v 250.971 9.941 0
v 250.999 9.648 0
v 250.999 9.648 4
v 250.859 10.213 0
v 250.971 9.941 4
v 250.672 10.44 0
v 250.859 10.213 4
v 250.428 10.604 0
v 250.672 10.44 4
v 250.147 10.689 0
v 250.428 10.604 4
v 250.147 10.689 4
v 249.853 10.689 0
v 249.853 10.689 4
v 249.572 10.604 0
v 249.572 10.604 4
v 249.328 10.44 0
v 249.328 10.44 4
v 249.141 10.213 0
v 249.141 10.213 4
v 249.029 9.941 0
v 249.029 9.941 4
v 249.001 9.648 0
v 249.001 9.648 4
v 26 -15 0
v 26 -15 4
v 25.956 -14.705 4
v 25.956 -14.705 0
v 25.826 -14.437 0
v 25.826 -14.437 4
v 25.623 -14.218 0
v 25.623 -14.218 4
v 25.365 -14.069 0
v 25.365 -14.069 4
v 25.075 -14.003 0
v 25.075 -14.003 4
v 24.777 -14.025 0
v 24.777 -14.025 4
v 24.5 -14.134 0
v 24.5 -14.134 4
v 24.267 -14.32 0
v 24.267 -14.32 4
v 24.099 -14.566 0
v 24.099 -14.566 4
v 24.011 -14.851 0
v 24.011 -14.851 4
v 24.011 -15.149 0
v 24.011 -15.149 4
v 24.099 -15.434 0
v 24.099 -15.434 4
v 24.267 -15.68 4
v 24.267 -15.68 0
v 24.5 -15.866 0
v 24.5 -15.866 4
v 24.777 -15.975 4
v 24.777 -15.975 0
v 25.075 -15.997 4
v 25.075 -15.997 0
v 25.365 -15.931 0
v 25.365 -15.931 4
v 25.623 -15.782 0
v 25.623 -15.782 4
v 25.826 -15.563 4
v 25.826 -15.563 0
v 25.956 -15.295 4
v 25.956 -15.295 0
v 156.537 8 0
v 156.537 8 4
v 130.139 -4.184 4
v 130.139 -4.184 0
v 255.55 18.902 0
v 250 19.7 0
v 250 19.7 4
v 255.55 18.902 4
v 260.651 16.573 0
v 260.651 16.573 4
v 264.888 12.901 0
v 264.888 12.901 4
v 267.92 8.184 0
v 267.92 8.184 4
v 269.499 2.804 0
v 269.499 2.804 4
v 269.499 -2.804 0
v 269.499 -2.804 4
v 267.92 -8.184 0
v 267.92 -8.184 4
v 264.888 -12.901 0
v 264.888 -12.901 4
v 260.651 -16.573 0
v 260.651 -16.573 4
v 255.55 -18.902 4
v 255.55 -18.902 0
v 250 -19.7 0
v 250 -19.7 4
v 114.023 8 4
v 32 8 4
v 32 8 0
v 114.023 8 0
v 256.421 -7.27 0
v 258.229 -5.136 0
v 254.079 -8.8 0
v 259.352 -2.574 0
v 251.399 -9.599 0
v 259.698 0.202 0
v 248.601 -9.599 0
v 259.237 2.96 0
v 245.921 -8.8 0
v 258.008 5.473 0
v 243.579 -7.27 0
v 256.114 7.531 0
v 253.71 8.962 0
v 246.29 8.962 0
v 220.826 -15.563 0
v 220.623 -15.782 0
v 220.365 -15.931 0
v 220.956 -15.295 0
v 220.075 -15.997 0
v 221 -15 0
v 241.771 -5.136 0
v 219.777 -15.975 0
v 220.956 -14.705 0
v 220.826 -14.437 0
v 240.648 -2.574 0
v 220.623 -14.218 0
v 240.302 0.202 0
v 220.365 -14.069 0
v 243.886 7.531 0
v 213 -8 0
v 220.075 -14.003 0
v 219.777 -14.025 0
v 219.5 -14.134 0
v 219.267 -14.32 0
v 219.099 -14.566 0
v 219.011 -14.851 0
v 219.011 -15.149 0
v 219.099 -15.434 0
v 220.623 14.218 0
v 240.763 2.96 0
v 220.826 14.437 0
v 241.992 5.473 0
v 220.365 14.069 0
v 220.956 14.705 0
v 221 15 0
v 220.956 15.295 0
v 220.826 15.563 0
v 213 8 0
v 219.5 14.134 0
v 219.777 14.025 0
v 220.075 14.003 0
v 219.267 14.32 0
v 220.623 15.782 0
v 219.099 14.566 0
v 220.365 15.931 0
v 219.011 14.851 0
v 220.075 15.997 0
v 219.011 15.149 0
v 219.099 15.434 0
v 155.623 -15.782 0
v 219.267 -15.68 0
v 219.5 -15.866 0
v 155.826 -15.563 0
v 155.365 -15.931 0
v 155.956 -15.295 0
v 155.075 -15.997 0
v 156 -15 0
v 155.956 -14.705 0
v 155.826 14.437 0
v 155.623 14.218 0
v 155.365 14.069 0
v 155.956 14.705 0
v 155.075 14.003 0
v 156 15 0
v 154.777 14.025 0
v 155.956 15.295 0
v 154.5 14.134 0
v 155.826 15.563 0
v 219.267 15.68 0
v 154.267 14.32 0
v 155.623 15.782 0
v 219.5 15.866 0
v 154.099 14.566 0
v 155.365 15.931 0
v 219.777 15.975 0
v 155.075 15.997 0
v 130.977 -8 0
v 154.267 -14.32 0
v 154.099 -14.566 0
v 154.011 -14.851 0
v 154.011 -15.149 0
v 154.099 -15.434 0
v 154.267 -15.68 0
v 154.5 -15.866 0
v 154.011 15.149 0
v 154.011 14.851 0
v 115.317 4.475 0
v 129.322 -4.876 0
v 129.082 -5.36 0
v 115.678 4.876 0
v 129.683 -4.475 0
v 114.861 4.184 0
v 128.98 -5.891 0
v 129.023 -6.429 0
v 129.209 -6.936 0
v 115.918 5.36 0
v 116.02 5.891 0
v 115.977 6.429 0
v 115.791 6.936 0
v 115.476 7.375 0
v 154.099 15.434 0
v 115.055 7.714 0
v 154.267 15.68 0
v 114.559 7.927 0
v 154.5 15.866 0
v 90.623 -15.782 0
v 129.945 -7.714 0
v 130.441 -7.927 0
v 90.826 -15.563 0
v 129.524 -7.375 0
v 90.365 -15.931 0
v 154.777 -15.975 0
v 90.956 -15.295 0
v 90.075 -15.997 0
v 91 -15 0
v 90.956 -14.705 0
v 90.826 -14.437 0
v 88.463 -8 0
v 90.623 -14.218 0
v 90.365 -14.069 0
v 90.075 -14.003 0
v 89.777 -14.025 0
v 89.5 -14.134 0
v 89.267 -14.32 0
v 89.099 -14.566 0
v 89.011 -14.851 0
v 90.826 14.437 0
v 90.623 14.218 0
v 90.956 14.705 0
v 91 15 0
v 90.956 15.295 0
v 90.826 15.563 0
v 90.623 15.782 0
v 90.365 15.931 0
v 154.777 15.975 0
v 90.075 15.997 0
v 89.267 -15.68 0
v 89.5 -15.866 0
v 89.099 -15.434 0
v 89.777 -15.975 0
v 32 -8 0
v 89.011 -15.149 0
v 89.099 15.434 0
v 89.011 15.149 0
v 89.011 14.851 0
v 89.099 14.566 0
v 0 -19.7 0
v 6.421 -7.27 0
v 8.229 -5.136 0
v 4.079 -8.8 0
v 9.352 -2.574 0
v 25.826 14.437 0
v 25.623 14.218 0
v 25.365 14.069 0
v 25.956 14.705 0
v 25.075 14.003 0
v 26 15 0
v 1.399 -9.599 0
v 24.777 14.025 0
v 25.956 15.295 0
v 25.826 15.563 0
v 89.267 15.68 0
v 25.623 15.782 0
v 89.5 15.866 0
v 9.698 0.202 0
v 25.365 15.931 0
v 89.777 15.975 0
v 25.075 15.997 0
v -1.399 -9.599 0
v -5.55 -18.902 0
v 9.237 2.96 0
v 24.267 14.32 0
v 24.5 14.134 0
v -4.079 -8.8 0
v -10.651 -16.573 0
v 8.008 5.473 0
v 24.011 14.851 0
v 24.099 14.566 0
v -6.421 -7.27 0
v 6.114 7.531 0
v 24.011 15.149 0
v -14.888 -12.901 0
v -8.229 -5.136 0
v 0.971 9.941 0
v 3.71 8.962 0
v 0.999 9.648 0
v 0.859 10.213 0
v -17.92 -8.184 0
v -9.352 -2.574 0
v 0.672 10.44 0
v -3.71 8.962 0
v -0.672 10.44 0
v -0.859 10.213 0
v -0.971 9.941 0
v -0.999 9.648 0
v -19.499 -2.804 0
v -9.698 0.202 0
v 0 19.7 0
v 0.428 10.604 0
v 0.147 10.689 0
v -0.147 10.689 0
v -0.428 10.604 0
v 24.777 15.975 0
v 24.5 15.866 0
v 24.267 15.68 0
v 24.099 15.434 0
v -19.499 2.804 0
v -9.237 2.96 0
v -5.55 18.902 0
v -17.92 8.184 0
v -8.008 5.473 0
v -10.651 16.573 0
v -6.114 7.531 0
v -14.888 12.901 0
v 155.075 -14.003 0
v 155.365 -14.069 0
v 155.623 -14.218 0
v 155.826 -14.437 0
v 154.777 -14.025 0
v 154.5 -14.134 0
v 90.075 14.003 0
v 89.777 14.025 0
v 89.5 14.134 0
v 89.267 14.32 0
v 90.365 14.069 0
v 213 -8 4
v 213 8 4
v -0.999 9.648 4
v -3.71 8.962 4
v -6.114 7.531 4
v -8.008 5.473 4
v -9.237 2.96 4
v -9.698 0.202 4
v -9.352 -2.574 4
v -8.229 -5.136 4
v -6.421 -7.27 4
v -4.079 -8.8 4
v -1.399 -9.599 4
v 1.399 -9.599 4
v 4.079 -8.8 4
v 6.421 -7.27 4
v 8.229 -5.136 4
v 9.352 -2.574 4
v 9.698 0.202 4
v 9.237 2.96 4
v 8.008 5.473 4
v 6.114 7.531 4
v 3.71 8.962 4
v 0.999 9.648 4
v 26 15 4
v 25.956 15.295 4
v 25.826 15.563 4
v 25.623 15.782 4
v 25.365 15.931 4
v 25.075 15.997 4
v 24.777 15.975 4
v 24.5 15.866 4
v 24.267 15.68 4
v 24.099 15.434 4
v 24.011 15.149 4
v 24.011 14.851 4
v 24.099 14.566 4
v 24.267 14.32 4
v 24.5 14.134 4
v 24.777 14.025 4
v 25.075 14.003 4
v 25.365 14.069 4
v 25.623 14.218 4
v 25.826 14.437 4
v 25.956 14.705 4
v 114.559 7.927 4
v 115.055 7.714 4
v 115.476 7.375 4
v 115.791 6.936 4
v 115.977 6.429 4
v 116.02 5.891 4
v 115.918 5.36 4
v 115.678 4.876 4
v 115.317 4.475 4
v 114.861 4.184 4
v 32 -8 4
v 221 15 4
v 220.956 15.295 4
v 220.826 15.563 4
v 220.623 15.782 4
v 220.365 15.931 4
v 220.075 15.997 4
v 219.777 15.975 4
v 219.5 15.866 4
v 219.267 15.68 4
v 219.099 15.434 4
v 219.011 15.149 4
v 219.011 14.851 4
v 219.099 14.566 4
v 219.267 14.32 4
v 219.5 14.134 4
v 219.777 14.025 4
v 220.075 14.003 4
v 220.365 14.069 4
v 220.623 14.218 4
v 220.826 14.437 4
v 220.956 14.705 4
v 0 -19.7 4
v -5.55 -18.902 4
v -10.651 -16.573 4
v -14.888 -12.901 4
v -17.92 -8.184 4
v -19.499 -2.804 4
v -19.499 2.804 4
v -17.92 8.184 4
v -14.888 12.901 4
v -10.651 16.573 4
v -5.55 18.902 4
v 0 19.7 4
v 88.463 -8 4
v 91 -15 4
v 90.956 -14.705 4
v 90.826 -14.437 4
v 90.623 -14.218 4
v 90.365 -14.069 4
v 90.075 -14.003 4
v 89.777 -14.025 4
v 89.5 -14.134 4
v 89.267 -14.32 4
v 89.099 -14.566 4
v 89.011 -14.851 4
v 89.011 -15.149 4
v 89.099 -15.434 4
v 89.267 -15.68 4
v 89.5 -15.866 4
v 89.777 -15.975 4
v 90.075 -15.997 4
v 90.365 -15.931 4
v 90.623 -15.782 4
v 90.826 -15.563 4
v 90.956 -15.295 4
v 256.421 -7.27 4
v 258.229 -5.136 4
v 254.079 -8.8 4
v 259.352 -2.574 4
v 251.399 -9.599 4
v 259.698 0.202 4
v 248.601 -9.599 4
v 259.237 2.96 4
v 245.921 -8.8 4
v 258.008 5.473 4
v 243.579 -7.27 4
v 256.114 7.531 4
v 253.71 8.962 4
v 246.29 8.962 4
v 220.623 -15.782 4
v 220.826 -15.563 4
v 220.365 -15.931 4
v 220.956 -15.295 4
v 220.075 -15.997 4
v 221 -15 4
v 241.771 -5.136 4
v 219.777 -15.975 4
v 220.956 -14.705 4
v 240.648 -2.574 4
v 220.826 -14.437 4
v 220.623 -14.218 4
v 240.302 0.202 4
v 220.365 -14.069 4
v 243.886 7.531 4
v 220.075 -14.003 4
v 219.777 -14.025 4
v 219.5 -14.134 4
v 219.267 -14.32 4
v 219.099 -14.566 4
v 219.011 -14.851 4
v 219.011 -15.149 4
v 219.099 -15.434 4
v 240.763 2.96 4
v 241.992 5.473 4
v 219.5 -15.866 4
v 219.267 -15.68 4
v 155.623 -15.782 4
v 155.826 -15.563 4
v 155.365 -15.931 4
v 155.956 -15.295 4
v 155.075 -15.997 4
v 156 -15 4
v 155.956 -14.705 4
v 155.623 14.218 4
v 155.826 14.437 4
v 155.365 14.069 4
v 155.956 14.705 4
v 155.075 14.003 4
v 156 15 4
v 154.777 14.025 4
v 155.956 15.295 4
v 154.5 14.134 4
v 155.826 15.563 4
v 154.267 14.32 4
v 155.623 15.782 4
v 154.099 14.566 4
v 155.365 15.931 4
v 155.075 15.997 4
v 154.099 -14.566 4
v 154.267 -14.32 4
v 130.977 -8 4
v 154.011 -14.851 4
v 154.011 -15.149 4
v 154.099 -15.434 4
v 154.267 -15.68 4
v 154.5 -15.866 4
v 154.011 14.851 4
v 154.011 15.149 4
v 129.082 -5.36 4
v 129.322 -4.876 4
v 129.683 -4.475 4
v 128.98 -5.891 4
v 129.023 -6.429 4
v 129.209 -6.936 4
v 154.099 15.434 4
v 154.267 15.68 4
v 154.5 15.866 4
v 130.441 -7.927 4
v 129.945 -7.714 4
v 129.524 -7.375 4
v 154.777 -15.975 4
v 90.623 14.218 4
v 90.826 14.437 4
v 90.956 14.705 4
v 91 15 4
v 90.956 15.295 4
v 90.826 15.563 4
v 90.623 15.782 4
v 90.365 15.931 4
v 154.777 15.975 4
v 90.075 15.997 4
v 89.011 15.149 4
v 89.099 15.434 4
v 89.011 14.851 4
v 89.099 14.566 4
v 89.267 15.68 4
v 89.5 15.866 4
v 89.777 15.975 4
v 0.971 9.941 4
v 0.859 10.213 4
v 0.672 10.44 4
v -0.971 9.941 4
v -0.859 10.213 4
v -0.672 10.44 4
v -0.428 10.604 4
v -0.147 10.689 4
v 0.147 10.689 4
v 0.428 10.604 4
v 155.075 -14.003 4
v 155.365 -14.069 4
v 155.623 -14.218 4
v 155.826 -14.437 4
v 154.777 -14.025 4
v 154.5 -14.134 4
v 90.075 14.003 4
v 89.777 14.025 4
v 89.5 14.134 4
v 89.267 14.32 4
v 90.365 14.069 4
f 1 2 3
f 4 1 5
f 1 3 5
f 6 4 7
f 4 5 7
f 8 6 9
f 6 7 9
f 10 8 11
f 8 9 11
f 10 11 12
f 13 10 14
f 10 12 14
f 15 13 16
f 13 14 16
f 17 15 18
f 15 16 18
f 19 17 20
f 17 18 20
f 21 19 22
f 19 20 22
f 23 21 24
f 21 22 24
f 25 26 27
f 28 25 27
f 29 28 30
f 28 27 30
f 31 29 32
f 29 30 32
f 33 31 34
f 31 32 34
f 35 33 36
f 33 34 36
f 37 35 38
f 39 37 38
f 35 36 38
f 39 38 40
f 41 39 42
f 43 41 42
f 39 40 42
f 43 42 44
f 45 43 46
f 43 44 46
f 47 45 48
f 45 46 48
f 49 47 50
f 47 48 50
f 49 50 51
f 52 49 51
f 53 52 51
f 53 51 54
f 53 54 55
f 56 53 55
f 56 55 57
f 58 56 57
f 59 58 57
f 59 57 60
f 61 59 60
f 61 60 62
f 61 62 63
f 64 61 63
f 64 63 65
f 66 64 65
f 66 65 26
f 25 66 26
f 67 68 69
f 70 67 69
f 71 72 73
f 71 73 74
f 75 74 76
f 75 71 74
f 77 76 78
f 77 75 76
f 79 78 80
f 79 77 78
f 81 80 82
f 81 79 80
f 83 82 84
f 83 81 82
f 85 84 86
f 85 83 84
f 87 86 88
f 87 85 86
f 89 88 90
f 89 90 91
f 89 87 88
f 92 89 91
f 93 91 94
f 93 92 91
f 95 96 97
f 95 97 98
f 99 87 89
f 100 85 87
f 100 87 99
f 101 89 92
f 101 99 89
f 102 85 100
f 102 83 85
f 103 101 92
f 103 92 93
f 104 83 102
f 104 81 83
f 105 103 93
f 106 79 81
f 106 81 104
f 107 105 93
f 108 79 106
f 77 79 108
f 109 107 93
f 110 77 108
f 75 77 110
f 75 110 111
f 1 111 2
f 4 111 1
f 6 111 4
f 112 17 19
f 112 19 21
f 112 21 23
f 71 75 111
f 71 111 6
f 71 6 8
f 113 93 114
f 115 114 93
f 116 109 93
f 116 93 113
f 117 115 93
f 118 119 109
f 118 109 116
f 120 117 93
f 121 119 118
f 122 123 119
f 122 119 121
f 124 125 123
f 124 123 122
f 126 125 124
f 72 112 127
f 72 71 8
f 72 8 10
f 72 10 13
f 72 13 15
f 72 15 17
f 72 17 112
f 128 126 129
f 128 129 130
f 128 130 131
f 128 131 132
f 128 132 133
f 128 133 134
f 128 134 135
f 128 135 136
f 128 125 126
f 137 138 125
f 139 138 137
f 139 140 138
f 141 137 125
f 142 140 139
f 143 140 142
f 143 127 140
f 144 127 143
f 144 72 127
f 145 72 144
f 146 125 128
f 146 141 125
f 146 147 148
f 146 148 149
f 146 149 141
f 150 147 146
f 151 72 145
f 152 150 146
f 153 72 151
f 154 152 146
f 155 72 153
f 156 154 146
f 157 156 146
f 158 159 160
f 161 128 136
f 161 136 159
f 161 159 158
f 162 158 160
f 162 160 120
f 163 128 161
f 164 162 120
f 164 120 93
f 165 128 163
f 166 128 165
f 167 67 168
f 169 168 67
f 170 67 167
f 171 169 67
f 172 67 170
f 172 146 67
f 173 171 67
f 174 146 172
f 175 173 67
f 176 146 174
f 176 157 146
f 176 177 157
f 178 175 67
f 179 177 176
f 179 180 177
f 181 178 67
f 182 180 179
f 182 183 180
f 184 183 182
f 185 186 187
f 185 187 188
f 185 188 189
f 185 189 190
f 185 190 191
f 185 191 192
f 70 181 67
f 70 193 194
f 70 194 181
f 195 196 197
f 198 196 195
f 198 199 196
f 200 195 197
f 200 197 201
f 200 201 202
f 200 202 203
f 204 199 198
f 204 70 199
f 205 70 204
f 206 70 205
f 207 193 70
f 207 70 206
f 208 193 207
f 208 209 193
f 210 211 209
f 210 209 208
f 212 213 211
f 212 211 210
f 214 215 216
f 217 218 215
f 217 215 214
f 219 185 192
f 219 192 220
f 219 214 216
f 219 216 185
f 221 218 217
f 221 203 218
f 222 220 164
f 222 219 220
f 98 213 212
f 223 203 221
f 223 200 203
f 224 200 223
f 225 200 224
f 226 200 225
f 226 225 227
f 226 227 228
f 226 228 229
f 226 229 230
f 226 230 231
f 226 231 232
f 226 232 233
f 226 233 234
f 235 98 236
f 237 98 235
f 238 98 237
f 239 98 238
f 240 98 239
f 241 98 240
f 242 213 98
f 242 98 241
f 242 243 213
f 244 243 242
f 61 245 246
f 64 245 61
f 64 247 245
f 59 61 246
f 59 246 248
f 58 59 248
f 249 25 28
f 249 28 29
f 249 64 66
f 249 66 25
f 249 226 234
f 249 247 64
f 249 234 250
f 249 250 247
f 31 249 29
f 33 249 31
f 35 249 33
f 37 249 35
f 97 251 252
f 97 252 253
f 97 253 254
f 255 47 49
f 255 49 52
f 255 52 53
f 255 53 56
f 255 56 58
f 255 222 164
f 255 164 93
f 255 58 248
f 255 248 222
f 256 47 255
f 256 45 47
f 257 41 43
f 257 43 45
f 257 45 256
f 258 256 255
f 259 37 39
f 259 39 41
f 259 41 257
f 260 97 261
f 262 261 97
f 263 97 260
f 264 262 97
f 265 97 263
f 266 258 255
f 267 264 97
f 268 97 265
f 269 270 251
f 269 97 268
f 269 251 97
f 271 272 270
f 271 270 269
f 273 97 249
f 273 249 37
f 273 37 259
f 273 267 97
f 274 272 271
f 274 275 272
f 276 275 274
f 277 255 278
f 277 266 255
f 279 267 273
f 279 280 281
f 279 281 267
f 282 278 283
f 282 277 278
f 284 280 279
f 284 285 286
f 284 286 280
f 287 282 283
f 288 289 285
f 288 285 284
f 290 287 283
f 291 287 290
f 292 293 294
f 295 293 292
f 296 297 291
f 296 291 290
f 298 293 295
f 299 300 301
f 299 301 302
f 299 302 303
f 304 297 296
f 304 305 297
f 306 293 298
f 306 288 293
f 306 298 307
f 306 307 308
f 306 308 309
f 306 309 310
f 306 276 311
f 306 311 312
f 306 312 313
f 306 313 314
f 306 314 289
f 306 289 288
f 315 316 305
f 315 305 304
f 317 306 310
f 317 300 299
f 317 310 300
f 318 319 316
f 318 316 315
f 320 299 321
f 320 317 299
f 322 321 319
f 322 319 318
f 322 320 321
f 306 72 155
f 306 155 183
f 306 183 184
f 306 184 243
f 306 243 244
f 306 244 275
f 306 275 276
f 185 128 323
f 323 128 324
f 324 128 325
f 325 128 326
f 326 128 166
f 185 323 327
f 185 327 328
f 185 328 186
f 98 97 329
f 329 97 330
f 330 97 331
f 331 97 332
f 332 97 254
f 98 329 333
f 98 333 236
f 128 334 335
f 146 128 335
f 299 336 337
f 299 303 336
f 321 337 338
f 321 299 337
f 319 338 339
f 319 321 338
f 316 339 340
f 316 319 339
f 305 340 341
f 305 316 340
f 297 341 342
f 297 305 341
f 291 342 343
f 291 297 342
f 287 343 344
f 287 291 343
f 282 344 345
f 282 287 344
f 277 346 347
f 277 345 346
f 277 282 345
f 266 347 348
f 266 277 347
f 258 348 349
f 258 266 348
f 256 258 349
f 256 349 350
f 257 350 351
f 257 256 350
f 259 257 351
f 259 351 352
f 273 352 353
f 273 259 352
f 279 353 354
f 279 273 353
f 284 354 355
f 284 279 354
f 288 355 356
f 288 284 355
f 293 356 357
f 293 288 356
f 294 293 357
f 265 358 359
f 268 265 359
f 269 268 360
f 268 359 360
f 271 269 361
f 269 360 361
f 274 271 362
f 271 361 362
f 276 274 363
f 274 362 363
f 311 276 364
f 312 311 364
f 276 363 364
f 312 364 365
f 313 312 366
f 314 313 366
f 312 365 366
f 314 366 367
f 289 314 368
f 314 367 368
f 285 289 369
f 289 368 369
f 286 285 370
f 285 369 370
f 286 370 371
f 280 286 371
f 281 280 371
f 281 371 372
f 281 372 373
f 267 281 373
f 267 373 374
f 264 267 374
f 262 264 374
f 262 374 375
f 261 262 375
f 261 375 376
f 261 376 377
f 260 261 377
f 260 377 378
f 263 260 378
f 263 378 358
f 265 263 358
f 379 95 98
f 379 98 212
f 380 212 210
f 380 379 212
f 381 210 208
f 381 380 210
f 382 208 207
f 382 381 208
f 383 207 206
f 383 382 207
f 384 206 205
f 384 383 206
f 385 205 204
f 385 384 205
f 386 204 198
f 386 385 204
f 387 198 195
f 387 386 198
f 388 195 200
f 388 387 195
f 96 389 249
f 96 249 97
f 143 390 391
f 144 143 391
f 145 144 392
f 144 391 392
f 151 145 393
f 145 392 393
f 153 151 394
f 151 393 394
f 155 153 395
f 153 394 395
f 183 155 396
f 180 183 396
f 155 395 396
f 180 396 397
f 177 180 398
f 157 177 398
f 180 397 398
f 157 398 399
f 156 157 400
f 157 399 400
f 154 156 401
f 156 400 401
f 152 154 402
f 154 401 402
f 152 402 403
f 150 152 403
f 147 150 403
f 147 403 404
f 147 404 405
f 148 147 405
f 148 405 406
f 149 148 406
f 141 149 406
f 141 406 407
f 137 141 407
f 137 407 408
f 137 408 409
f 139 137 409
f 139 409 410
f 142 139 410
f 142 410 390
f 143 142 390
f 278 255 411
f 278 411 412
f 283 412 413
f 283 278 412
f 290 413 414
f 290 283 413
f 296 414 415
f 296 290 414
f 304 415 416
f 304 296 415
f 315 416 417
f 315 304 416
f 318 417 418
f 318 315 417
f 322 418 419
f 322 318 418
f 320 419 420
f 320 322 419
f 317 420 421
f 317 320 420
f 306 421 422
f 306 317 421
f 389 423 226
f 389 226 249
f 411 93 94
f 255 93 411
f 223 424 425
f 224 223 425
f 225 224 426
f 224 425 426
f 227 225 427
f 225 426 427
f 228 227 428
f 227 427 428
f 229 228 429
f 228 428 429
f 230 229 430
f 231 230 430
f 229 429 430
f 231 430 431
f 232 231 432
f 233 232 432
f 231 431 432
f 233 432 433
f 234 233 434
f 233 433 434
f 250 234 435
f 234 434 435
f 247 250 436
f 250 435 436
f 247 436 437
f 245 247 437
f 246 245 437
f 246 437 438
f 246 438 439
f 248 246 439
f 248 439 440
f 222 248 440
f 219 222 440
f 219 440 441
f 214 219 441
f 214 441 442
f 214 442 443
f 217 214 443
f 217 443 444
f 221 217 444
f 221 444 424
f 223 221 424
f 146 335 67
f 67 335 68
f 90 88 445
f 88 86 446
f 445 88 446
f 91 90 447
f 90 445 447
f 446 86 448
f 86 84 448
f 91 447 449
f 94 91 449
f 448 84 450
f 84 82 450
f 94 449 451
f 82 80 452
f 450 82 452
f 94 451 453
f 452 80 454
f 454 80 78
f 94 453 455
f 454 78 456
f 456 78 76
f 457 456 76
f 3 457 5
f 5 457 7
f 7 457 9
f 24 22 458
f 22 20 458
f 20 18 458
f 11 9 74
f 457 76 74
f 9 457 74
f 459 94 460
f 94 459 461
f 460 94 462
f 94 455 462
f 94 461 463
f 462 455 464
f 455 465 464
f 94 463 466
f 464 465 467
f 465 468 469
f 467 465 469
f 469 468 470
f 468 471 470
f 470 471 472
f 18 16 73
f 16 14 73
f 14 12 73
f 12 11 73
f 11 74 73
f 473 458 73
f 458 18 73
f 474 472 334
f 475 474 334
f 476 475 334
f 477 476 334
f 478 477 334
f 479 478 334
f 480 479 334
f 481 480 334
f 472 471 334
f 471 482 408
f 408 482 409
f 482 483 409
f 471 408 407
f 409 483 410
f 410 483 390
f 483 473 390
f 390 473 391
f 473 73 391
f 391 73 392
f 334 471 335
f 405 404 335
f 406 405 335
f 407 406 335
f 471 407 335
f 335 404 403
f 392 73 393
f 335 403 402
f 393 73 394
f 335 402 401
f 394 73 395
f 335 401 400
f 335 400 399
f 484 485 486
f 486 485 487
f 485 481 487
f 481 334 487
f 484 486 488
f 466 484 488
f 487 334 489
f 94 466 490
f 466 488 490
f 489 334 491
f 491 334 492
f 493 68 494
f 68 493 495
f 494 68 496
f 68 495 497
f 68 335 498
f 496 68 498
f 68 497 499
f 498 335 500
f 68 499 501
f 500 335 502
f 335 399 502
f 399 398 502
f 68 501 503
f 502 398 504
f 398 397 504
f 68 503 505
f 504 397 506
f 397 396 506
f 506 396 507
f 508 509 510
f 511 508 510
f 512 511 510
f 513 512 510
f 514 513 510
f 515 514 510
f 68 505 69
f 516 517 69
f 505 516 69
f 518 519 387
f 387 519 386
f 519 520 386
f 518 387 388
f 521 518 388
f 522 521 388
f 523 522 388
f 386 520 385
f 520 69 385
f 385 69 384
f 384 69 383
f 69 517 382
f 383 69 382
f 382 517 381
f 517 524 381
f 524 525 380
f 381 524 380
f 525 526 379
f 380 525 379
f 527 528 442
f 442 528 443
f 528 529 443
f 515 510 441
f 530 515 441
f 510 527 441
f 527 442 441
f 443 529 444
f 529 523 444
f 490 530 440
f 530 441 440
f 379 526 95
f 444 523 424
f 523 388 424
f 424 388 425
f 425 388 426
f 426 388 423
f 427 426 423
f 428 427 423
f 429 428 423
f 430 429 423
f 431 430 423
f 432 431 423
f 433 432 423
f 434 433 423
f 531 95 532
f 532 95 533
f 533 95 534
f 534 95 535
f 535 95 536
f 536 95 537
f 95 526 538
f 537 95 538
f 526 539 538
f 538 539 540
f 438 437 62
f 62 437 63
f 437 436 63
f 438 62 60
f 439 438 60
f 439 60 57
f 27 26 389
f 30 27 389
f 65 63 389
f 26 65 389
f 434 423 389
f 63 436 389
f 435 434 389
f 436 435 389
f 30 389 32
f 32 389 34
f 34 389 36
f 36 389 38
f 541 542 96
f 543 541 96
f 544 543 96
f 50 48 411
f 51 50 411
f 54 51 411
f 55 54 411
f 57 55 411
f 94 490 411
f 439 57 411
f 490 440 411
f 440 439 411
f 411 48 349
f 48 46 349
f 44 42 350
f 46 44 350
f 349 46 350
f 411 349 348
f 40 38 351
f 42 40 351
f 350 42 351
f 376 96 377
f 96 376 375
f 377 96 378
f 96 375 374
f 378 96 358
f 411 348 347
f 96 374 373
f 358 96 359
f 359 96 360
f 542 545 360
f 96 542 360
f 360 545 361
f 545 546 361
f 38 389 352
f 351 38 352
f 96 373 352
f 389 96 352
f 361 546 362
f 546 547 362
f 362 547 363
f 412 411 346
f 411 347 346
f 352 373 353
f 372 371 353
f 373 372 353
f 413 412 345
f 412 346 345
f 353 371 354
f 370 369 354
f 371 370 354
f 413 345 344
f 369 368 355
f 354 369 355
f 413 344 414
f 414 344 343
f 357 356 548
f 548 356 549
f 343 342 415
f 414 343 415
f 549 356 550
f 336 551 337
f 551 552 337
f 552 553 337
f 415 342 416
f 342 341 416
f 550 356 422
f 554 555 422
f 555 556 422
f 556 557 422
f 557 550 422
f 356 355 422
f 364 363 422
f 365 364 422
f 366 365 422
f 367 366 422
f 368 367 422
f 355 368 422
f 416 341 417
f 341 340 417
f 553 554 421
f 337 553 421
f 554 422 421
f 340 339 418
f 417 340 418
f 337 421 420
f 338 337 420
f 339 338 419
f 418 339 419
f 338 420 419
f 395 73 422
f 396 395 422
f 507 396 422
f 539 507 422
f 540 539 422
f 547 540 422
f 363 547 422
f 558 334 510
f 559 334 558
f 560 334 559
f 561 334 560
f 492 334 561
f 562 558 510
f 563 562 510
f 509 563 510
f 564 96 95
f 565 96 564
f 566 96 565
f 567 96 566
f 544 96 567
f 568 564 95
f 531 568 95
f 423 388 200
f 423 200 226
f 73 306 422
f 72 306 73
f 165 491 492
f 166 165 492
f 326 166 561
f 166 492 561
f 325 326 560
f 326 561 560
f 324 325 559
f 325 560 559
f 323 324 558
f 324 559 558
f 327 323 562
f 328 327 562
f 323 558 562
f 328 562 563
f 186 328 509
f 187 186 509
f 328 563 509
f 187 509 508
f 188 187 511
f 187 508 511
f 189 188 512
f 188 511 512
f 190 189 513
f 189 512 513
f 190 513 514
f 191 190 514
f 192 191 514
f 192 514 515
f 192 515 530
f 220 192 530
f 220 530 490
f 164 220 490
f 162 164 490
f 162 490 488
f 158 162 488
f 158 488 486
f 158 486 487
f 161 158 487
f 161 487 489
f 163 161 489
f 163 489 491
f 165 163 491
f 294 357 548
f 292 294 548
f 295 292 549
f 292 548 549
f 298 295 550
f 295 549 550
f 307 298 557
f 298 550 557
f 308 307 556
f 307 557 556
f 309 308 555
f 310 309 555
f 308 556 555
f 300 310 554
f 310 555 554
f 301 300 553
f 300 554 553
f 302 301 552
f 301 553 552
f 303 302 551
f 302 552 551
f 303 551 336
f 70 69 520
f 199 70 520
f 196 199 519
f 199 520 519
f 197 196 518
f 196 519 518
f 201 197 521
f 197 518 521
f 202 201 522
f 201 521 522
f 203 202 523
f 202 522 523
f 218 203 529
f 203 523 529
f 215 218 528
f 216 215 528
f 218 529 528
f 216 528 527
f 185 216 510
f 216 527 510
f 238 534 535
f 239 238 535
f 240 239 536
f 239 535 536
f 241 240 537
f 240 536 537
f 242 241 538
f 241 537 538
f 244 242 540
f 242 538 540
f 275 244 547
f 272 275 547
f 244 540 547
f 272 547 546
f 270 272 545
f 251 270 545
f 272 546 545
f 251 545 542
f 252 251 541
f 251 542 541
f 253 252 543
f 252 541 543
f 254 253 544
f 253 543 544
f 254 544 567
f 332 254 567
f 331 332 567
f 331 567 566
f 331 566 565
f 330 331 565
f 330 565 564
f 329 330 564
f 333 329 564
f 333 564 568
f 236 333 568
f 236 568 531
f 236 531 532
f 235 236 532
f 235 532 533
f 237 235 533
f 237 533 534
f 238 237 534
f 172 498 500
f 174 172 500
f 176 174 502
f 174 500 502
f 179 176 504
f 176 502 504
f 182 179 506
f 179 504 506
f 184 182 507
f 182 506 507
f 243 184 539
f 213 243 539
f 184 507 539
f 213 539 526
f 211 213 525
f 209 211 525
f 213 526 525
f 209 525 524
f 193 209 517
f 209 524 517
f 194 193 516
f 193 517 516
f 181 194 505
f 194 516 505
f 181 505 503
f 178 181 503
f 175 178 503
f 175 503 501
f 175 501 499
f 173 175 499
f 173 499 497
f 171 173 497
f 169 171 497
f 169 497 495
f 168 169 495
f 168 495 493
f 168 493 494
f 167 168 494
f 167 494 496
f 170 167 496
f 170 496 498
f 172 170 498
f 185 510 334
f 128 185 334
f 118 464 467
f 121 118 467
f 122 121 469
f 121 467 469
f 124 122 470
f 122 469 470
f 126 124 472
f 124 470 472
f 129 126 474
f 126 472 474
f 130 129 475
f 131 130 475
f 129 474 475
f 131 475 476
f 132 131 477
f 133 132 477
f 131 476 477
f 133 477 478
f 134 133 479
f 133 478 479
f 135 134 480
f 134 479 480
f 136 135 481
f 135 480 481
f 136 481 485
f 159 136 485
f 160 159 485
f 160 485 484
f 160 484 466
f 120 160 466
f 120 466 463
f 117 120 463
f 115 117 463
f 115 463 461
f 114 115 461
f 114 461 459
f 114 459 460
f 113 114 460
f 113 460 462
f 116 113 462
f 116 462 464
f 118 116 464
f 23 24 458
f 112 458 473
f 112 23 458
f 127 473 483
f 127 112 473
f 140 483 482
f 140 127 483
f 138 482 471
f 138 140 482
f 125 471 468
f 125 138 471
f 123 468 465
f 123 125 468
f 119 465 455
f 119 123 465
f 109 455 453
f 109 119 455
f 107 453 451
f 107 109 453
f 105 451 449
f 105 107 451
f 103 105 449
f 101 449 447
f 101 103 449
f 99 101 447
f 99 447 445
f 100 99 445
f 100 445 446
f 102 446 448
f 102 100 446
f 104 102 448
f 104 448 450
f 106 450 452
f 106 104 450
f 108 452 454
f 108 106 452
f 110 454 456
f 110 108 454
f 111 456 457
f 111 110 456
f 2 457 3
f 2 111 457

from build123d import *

# Parameters (mm, degrees)
SKETCH_1_R          = 9.7
EXTRUDE_1_DEPTH     = 4
SKETCH_2_R          = 1
CUT_EXTRUDE_1_DEPTH = 10
CUT_EXTRUDE_2_DEPTH = 10
SKETCH_4_R          = 1
CUT_EXTRUDE_3_DEPTH = 10


with BuildPart() as part:
    # 草图1 → 凸台-拉伸1 (new body)
    with BuildSketch(Plane.XY):
        with BuildLine():
            Line((0, 19.7), (250, 19.7))
            ThreePointArc((250, 19.7), (269.7, 0), (250, -19.7))
            Line((250, -19.7), (0, -19.7))
            ThreePointArc((0, -19.7), (-19.7, 0), (0, 19.7))
        make_face()
        Circle(SKETCH_1_R, mode=Mode.SUBTRACT)
        with Locations((250, 0)):
            Circle(SKETCH_1_R, mode=Mode.SUBTRACT)
    extrude(amount=EXTRUDE_1_DEPTH)

    # 草图2 → 切除-拉伸1 (cut)
    with BuildSketch(Plane.XY.offset(4)):
        with Locations((25, 15)):
            Circle(SKETCH_2_R)
        with Locations((90, 15)):
            Circle(SKETCH_2_R)
        with Locations((155, 15)):
            Circle(SKETCH_2_R)
        with Locations((220, 15)):
            Circle(SKETCH_2_R)
        with Locations((90, -15)):
            Circle(SKETCH_2_R)
        with Locations((155, -15)):
            Circle(SKETCH_2_R)
        with Locations((220, -15)):
            Circle(SKETCH_2_R)
        with Locations((25, -15)):
            Circle(SKETCH_2_R)
    extrude(amount=-CUT_EXTRUDE_1_DEPTH, mode=Mode.SUBTRACT)

    # 草图3 → 切除-拉伸2 (cut)
    with BuildSketch(Plane.XY.offset(4)):
        with BuildLine():
            Line((32, 8), (114.023268405, 8))
            ThreePointArc((114.023268405, 8), (115.976706085, 6.429046887), (114.86138476, 4.184081231))
            Line((114.86138476, 4.184081231), (88.462542093, -8))
            Line((88.462542093, -8), (32, -8))
            Line((32, -8), (32, 8))
        make_face()
        with BuildLine():
            Line((156.537457907, 8), (130.13861524, -4.184081231))
            ThreePointArc((130.13861524, -4.184081231), (129.023293915, -6.429046887), (130.976731595, -8))
            Line((130.976731595, -8), (213, -8))
            Line((213, -8), (213, 8))
            Line((213, 8), (156.537457907, 8))
        make_face()
    extrude(amount=-CUT_EXTRUDE_2_DEPTH, mode=Mode.SUBTRACT)

    # 草图4 → 切除-拉伸3 (cut)
    with BuildSketch(Plane.XY.offset(4)):
        with Locations((0, 9.7)):
            Circle(SKETCH_4_R)
        with Locations((250, 9.7)):
            Circle(SKETCH_4_R)
    extrude(amount=-CUT_EXTRUDE_3_DEPTH, mode=Mode.SUBTRACT)


solid = part.part
